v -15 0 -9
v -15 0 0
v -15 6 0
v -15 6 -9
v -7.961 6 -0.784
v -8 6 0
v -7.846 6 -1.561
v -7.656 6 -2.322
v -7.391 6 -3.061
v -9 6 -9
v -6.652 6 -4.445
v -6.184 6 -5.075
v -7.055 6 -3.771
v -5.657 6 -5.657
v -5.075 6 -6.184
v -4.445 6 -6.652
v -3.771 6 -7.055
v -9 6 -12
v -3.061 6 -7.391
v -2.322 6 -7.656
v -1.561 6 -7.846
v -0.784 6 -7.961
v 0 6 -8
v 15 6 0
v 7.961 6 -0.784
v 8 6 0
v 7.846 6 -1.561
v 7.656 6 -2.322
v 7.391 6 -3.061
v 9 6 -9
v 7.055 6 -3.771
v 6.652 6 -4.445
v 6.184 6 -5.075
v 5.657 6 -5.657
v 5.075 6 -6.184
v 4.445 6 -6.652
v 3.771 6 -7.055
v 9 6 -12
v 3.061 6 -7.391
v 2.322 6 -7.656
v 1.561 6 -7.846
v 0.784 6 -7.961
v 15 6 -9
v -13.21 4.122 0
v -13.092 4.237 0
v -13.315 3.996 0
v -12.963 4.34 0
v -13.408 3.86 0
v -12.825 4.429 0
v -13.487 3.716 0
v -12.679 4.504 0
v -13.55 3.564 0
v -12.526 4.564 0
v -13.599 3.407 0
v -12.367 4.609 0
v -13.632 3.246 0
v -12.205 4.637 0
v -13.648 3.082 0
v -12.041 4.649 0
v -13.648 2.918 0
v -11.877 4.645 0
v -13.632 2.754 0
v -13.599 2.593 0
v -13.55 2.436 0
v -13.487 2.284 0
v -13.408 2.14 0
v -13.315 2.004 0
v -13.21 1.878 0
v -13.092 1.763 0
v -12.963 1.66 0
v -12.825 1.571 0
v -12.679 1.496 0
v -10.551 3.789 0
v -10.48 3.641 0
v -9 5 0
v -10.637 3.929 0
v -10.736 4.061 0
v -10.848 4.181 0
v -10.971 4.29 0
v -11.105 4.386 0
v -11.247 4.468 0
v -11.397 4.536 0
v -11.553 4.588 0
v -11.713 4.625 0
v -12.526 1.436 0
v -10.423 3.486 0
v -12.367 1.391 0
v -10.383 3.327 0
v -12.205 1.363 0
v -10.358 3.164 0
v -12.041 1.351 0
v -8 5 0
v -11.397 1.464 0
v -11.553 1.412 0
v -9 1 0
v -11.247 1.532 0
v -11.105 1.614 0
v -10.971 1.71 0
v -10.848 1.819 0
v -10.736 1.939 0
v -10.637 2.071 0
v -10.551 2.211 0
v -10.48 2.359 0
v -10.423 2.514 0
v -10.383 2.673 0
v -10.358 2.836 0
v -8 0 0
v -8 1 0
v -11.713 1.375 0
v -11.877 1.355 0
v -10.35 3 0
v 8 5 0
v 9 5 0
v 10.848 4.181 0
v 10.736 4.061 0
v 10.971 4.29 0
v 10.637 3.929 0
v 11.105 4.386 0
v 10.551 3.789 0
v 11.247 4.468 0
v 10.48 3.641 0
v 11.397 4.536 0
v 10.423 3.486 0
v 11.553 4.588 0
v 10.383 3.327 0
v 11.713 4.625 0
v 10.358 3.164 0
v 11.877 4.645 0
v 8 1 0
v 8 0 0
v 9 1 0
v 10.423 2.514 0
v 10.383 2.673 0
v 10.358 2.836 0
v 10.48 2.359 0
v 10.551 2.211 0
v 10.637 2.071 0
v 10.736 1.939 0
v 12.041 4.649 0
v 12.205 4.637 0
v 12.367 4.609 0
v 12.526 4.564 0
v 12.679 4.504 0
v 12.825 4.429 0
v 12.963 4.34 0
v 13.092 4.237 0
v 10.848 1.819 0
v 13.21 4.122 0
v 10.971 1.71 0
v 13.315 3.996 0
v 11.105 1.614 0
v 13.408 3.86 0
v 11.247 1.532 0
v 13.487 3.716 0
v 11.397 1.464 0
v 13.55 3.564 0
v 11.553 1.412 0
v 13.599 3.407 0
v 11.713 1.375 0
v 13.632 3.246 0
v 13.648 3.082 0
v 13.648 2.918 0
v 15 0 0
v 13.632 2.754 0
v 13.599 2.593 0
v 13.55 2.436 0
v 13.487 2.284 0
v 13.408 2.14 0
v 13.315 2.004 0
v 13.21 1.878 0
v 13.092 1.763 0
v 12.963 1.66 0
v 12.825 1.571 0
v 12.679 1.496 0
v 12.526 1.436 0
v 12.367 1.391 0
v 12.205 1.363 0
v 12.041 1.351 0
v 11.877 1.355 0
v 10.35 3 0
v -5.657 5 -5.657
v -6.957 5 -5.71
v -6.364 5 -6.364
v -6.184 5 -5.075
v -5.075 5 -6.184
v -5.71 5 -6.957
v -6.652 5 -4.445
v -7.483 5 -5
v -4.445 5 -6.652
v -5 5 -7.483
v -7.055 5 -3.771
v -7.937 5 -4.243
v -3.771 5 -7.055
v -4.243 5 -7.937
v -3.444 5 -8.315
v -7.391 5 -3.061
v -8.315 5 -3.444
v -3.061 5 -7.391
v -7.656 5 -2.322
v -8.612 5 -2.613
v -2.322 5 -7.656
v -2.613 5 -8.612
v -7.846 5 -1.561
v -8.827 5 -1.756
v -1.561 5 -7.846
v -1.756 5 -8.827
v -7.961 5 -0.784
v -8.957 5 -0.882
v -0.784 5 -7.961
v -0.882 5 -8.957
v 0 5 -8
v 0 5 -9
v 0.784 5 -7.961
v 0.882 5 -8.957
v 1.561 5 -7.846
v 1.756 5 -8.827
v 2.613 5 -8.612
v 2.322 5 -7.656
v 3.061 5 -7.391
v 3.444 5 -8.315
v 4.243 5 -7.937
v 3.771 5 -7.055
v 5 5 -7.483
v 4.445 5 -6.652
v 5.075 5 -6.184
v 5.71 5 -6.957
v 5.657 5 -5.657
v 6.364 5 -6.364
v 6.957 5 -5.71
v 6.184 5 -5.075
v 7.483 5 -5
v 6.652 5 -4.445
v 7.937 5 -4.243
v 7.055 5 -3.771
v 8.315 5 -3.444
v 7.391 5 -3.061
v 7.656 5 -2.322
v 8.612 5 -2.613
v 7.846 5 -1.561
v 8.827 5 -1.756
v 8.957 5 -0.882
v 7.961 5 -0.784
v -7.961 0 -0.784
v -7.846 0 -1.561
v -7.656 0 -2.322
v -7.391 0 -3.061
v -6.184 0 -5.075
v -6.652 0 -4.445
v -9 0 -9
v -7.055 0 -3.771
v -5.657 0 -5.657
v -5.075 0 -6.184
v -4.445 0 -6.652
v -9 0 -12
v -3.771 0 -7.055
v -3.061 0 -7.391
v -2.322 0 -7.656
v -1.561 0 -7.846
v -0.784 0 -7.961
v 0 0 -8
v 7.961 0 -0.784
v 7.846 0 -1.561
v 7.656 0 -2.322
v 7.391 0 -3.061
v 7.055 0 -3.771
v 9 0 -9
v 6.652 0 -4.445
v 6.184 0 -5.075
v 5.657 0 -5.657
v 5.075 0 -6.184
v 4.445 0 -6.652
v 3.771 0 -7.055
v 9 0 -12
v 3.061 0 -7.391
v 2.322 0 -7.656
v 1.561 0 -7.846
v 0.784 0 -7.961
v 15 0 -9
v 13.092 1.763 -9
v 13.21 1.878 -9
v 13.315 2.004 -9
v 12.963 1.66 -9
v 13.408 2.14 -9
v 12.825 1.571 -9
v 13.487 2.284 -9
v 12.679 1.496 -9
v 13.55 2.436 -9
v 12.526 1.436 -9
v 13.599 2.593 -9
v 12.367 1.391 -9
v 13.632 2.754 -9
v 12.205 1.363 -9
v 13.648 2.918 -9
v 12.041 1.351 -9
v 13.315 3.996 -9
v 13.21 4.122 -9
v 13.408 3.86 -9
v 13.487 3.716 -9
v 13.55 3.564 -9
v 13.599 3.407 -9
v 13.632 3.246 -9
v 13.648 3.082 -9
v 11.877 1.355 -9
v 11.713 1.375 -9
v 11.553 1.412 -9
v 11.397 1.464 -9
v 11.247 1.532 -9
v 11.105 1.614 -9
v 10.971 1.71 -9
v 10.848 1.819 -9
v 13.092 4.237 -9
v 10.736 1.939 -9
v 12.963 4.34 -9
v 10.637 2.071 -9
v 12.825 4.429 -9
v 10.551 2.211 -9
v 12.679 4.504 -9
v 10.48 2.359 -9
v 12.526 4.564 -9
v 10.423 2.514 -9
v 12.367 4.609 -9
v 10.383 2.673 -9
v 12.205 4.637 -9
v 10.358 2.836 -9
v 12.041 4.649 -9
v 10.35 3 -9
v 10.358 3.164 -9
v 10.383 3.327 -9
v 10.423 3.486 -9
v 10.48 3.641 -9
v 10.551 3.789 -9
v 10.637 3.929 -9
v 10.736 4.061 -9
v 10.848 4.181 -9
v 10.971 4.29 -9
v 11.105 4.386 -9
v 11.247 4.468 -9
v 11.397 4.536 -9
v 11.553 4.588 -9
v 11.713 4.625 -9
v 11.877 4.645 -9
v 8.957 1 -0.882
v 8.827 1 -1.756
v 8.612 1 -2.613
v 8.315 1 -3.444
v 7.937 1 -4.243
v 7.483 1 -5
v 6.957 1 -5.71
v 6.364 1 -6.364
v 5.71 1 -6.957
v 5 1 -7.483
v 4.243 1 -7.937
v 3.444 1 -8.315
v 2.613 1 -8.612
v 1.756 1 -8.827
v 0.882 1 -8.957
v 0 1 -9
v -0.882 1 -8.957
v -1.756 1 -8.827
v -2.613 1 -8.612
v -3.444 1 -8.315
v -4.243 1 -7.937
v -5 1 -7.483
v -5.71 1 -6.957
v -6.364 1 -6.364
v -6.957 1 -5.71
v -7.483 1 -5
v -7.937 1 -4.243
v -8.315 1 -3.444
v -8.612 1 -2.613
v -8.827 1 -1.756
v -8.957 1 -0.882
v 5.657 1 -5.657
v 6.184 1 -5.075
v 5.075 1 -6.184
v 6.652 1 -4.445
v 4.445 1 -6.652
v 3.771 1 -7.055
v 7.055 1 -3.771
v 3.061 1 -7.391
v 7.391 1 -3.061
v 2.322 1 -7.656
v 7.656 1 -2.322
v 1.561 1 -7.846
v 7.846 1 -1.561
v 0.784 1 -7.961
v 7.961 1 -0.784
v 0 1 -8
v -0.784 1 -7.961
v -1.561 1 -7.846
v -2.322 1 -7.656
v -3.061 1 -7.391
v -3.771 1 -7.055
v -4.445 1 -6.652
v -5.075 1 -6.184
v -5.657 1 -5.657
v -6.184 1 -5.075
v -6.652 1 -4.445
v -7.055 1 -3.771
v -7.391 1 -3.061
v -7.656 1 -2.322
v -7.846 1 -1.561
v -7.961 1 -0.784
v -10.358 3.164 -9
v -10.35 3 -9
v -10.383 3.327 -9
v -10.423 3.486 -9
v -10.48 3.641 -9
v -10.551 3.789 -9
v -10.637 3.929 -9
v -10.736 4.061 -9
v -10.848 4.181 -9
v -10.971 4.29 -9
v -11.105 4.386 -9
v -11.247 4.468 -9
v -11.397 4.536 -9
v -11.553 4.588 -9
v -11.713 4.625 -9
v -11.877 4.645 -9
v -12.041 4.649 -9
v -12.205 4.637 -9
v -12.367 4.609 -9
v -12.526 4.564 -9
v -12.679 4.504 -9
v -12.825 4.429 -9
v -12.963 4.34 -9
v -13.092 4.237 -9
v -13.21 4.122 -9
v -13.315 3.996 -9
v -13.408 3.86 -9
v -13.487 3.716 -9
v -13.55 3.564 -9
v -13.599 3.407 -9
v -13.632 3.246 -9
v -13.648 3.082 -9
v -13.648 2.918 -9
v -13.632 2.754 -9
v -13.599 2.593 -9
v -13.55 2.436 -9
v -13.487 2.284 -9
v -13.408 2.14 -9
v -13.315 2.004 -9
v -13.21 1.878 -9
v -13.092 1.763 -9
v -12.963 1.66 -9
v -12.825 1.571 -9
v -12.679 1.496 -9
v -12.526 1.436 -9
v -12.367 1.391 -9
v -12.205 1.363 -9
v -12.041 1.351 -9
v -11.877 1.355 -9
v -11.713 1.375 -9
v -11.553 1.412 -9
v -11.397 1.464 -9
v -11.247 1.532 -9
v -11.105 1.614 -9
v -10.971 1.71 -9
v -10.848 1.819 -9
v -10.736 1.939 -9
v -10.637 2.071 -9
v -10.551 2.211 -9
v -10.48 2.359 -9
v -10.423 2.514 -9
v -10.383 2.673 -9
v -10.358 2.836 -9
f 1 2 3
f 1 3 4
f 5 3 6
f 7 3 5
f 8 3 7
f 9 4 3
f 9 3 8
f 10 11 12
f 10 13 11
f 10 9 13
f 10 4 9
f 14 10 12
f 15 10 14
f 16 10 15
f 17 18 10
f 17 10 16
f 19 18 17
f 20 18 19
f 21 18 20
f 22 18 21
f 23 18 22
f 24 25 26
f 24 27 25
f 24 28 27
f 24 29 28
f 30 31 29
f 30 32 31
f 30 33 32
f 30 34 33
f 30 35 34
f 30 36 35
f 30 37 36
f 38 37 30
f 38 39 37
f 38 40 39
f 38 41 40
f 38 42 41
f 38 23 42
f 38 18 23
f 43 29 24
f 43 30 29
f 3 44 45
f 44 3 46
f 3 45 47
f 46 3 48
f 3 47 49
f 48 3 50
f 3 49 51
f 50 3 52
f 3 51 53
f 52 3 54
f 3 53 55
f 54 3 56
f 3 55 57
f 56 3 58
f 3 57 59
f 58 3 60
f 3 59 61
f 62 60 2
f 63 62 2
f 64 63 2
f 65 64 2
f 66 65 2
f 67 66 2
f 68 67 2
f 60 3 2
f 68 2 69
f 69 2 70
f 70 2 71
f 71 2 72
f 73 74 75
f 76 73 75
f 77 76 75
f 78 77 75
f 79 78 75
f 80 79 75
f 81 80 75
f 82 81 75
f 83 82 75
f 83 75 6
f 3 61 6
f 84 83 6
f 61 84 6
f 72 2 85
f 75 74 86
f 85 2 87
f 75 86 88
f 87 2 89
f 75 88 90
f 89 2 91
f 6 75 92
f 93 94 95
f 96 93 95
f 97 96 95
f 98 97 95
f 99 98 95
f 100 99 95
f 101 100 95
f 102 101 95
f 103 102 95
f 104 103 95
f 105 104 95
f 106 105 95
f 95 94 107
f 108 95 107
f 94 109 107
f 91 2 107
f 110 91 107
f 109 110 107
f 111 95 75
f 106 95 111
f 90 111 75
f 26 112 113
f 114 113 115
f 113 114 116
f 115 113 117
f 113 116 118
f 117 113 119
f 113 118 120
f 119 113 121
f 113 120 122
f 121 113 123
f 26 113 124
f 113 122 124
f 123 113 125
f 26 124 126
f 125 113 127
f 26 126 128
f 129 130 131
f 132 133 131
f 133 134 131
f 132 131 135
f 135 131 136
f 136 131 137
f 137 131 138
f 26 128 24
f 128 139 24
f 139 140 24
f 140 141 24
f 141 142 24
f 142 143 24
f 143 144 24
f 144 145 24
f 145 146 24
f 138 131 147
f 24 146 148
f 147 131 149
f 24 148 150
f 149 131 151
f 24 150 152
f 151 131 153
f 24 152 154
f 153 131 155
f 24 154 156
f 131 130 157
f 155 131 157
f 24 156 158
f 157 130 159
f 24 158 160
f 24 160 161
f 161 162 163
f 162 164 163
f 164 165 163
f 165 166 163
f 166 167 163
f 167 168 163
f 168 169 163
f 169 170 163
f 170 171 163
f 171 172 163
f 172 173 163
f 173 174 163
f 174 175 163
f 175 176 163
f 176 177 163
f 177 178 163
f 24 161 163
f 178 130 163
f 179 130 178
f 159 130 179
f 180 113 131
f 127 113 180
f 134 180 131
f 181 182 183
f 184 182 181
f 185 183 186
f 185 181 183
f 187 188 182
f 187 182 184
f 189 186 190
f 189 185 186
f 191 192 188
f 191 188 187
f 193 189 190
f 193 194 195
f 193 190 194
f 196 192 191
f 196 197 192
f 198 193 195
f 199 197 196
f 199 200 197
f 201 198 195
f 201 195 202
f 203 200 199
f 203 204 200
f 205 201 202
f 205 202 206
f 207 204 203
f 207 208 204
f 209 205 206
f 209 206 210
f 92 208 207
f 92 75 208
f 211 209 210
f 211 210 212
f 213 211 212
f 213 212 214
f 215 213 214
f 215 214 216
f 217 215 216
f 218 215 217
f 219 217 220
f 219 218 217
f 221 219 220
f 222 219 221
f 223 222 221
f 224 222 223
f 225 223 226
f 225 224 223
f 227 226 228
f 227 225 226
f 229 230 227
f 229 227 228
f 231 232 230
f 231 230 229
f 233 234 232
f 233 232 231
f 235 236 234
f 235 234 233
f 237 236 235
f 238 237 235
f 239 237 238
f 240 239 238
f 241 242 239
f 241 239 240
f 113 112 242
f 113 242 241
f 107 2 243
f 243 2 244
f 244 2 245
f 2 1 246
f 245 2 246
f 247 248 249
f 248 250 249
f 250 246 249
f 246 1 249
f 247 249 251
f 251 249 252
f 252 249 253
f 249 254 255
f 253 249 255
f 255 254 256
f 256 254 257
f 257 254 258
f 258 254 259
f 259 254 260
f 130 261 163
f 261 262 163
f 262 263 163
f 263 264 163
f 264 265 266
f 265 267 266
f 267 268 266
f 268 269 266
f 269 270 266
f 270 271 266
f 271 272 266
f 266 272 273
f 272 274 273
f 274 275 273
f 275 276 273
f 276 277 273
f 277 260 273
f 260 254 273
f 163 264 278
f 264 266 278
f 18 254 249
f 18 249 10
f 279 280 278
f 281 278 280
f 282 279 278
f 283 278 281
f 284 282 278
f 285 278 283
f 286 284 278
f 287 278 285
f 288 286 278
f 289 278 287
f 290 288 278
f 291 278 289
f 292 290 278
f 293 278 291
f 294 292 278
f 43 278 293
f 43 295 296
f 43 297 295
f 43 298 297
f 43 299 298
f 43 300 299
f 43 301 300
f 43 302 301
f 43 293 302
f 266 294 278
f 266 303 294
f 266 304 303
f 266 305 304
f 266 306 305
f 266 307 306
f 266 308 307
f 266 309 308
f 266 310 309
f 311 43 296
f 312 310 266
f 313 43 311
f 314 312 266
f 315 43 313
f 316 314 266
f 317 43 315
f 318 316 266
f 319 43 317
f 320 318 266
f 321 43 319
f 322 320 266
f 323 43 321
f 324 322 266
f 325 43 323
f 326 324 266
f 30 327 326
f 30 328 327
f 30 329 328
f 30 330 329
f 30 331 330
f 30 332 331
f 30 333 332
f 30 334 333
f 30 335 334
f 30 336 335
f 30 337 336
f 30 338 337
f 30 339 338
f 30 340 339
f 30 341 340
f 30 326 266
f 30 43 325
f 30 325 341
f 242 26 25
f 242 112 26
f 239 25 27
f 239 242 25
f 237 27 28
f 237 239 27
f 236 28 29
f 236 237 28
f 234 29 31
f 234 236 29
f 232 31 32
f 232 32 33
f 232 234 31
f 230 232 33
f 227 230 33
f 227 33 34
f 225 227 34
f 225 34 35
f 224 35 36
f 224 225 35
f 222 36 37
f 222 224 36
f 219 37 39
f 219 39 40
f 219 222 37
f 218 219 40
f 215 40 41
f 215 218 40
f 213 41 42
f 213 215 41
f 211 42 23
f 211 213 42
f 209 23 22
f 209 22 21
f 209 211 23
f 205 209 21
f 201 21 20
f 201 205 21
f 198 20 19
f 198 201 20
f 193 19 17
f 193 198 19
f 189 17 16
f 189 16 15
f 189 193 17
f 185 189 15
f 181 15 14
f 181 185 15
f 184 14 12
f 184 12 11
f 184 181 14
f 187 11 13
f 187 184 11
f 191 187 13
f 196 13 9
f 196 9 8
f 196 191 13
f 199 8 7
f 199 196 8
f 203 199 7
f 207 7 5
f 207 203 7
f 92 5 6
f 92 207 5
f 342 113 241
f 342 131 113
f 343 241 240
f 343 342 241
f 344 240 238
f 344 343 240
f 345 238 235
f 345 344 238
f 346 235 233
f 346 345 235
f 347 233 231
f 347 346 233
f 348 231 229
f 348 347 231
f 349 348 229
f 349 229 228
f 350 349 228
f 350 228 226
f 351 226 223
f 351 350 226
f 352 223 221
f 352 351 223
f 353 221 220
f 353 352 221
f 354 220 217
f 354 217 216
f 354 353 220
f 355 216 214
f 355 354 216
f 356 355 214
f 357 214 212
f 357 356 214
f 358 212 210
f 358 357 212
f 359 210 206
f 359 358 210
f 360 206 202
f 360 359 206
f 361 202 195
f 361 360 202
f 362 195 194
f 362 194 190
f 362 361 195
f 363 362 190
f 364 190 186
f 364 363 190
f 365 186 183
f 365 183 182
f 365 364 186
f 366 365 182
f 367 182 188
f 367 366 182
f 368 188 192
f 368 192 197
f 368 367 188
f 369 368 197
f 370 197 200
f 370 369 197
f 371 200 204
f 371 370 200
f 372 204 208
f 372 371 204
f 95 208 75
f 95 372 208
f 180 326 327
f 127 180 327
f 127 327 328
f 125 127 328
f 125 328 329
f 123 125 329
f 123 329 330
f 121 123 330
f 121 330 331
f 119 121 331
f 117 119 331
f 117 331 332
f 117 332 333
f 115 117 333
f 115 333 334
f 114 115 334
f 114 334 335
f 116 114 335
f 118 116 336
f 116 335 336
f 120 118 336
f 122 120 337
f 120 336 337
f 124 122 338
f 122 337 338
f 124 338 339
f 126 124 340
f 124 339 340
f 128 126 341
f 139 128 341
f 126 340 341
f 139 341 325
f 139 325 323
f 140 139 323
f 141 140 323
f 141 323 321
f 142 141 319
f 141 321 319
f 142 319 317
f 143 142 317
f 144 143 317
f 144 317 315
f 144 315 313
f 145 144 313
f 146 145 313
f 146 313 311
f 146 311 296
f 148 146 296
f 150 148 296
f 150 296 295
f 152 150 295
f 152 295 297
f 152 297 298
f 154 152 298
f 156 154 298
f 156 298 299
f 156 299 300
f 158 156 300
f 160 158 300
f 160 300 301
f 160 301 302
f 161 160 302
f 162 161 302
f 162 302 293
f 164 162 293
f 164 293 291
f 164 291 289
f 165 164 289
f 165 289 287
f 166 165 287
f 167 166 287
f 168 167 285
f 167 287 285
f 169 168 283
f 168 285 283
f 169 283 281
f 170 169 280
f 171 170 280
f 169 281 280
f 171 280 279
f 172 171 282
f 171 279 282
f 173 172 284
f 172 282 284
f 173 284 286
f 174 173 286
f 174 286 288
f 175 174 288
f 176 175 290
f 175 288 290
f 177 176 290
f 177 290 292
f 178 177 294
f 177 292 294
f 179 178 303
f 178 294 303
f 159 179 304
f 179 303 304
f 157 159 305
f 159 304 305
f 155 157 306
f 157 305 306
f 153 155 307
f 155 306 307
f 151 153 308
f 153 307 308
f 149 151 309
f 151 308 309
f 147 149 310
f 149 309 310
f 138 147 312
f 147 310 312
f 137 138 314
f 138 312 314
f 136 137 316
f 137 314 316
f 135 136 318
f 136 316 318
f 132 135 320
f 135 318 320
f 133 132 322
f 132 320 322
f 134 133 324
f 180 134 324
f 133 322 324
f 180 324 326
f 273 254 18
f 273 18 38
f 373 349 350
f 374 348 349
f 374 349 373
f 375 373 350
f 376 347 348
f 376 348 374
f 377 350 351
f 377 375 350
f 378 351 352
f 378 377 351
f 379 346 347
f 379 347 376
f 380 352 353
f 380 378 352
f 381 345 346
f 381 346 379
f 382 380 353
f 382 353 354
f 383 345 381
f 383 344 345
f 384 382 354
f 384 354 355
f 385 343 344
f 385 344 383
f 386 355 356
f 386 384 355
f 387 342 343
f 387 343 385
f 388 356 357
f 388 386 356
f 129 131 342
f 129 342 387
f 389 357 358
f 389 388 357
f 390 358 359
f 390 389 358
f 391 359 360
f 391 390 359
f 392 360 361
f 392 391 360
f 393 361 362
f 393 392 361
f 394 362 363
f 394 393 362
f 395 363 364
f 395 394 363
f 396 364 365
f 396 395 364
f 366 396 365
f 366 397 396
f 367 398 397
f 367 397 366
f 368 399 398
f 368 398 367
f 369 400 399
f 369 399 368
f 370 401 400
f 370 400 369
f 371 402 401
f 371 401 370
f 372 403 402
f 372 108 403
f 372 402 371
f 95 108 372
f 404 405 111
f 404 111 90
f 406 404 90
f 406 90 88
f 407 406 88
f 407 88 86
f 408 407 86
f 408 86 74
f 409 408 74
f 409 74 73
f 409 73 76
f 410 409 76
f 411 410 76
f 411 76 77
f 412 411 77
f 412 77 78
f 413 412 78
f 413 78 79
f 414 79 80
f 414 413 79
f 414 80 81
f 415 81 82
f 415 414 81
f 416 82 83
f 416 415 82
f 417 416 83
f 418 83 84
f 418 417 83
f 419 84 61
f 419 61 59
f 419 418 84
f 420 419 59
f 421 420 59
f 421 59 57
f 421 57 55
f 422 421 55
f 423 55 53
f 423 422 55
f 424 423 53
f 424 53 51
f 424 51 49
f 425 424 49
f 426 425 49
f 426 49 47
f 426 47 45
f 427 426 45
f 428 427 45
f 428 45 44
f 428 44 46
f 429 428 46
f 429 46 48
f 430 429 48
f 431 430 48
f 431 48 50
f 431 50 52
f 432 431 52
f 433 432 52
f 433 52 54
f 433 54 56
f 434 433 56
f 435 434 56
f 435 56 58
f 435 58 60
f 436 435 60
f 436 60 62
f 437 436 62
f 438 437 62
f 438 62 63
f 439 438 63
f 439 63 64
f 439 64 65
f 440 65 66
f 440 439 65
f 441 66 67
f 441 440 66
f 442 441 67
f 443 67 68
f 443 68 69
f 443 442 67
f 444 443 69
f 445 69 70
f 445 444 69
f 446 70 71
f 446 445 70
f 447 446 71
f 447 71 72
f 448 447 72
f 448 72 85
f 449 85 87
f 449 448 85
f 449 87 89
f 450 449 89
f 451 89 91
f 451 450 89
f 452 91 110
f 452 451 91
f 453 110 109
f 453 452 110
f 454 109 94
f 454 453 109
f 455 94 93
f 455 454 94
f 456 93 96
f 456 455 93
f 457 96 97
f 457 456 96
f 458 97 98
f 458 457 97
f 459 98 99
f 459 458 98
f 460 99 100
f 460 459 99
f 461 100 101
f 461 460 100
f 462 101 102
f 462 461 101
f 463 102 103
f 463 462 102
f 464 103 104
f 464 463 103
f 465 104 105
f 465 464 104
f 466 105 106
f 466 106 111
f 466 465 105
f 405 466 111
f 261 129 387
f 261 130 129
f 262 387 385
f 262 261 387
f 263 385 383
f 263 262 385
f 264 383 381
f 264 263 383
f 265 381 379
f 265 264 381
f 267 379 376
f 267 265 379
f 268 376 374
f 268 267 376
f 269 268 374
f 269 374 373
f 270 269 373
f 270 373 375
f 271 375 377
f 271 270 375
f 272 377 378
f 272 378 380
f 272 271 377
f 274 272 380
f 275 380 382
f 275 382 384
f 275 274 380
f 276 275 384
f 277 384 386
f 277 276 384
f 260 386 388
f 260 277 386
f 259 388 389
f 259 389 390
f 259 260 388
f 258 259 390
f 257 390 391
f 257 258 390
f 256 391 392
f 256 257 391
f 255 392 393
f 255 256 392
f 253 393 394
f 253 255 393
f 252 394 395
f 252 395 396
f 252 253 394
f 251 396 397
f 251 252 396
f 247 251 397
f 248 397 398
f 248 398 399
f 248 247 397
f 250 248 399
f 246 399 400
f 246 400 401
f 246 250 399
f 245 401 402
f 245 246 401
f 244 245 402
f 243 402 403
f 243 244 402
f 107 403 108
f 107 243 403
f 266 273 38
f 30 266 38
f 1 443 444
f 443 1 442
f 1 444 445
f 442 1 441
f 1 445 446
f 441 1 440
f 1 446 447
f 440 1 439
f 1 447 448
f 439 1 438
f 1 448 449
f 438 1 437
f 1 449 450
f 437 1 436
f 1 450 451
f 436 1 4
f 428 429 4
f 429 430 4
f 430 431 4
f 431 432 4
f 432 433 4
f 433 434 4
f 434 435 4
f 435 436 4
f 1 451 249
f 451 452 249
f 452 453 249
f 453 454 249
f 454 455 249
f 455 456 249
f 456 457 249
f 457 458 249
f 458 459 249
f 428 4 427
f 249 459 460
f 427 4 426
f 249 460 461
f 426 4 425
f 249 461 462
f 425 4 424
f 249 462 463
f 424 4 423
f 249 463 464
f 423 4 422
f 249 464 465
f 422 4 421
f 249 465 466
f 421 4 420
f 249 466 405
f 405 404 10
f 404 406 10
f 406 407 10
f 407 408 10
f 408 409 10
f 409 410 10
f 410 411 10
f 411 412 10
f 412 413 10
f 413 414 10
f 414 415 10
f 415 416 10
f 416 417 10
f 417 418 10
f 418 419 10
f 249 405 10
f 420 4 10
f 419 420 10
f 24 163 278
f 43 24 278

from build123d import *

# Parameters (mm, degrees)
SKETCH_1_W          = 30
SKETCH_1_H          = 12
EXTRUDE_1_DEPTH     = 6
SKETCH_3_W          = 6
SKETCH_3_H          = 6
CUT_EXTRUDE_1_DEPTH = 3
CUT_EXTRUDE_2_REACH = 20.493
SKETCH_4_R          = 1.65


with BuildPart() as part:
    # 草图1 → 凸台-拉伸1 (new body)
    with BuildSketch(Plane(origin=(0, 0, 0), x_dir=(1, 0, 0), z_dir=(0, 1, 0))):
        with Locations((0, 6)):
            Rectangle(SKETCH_1_W, SKETCH_1_H)
    extrude(amount=EXTRUDE_1_DEPTH)

    # 草图2 → 切除-旋转1 (revolve, cut)
    with BuildSketch(Plane.XY):
        Polygon((-8, 0), (0, 0), (0, 3), (-9, 3), (-9, 1), (-8, 1), align=None)
        Polygon((-9, 3), (0, 3), (0, 6), (-8, 6), (-8, 5), (-9, 5), align=None)
    revolve(axis=Axis((0, 0, 0), (0, 1, 0)), mode=Mode.SUBTRACT)

    # 草图3 → 切除-拉伸1 (cut)
    with BuildSketch(Plane(origin=(0, 0, -12), x_dir=(-1, 0, 0), z_dir=(0, 0, -1))):
        with Locations((-12, 3)):
            Rectangle(SKETCH_3_W, SKETCH_3_H)
    cut_extrude_1 = extrude(amount=-CUT_EXTRUDE_1_DEPTH, mode=Mode.SUBTRACT)

    # 草图4 → 切除-拉伸2 (cut, up to next)
    with BuildSketch(Plane(origin=(0, 0, -9), x_dir=(-1, 0, 0), z_dir=(0, 0, -1)), mode=Mode.PRIVATE) as cut_extrude_2_sk1:
        with Locations((-12, 3)):
            Circle(SKETCH_4_R)
    cut_extrude_2_tool1 = extrude(cut_extrude_2_sk1.sketch, amount=-CUT_EXTRUDE_2_REACH, mode=Mode.PRIVATE) & part.part
    cut_extrude_2 = cut_extrude_2_tool1.solids().sort_by_distance((12, 3, -9))[0]
    add(cut_extrude_2, mode=Mode.SUBTRACT)

    # 镜向1: 切除-拉伸1, 切除-拉伸2 across plane
    add(cut_extrude_1.mirror(Plane(origin=(0, 0, 0), x_dir=(0, 0, 1), z_dir=(1, 0, 0))), mode=Mode.SUBTRACT)
    add(cut_extrude_2.mirror(Plane(origin=(0, 0, 0), x_dir=(0, 0, 1), z_dir=(1, 0, 0))), mode=Mode.SUBTRACT)


solid = part.part
